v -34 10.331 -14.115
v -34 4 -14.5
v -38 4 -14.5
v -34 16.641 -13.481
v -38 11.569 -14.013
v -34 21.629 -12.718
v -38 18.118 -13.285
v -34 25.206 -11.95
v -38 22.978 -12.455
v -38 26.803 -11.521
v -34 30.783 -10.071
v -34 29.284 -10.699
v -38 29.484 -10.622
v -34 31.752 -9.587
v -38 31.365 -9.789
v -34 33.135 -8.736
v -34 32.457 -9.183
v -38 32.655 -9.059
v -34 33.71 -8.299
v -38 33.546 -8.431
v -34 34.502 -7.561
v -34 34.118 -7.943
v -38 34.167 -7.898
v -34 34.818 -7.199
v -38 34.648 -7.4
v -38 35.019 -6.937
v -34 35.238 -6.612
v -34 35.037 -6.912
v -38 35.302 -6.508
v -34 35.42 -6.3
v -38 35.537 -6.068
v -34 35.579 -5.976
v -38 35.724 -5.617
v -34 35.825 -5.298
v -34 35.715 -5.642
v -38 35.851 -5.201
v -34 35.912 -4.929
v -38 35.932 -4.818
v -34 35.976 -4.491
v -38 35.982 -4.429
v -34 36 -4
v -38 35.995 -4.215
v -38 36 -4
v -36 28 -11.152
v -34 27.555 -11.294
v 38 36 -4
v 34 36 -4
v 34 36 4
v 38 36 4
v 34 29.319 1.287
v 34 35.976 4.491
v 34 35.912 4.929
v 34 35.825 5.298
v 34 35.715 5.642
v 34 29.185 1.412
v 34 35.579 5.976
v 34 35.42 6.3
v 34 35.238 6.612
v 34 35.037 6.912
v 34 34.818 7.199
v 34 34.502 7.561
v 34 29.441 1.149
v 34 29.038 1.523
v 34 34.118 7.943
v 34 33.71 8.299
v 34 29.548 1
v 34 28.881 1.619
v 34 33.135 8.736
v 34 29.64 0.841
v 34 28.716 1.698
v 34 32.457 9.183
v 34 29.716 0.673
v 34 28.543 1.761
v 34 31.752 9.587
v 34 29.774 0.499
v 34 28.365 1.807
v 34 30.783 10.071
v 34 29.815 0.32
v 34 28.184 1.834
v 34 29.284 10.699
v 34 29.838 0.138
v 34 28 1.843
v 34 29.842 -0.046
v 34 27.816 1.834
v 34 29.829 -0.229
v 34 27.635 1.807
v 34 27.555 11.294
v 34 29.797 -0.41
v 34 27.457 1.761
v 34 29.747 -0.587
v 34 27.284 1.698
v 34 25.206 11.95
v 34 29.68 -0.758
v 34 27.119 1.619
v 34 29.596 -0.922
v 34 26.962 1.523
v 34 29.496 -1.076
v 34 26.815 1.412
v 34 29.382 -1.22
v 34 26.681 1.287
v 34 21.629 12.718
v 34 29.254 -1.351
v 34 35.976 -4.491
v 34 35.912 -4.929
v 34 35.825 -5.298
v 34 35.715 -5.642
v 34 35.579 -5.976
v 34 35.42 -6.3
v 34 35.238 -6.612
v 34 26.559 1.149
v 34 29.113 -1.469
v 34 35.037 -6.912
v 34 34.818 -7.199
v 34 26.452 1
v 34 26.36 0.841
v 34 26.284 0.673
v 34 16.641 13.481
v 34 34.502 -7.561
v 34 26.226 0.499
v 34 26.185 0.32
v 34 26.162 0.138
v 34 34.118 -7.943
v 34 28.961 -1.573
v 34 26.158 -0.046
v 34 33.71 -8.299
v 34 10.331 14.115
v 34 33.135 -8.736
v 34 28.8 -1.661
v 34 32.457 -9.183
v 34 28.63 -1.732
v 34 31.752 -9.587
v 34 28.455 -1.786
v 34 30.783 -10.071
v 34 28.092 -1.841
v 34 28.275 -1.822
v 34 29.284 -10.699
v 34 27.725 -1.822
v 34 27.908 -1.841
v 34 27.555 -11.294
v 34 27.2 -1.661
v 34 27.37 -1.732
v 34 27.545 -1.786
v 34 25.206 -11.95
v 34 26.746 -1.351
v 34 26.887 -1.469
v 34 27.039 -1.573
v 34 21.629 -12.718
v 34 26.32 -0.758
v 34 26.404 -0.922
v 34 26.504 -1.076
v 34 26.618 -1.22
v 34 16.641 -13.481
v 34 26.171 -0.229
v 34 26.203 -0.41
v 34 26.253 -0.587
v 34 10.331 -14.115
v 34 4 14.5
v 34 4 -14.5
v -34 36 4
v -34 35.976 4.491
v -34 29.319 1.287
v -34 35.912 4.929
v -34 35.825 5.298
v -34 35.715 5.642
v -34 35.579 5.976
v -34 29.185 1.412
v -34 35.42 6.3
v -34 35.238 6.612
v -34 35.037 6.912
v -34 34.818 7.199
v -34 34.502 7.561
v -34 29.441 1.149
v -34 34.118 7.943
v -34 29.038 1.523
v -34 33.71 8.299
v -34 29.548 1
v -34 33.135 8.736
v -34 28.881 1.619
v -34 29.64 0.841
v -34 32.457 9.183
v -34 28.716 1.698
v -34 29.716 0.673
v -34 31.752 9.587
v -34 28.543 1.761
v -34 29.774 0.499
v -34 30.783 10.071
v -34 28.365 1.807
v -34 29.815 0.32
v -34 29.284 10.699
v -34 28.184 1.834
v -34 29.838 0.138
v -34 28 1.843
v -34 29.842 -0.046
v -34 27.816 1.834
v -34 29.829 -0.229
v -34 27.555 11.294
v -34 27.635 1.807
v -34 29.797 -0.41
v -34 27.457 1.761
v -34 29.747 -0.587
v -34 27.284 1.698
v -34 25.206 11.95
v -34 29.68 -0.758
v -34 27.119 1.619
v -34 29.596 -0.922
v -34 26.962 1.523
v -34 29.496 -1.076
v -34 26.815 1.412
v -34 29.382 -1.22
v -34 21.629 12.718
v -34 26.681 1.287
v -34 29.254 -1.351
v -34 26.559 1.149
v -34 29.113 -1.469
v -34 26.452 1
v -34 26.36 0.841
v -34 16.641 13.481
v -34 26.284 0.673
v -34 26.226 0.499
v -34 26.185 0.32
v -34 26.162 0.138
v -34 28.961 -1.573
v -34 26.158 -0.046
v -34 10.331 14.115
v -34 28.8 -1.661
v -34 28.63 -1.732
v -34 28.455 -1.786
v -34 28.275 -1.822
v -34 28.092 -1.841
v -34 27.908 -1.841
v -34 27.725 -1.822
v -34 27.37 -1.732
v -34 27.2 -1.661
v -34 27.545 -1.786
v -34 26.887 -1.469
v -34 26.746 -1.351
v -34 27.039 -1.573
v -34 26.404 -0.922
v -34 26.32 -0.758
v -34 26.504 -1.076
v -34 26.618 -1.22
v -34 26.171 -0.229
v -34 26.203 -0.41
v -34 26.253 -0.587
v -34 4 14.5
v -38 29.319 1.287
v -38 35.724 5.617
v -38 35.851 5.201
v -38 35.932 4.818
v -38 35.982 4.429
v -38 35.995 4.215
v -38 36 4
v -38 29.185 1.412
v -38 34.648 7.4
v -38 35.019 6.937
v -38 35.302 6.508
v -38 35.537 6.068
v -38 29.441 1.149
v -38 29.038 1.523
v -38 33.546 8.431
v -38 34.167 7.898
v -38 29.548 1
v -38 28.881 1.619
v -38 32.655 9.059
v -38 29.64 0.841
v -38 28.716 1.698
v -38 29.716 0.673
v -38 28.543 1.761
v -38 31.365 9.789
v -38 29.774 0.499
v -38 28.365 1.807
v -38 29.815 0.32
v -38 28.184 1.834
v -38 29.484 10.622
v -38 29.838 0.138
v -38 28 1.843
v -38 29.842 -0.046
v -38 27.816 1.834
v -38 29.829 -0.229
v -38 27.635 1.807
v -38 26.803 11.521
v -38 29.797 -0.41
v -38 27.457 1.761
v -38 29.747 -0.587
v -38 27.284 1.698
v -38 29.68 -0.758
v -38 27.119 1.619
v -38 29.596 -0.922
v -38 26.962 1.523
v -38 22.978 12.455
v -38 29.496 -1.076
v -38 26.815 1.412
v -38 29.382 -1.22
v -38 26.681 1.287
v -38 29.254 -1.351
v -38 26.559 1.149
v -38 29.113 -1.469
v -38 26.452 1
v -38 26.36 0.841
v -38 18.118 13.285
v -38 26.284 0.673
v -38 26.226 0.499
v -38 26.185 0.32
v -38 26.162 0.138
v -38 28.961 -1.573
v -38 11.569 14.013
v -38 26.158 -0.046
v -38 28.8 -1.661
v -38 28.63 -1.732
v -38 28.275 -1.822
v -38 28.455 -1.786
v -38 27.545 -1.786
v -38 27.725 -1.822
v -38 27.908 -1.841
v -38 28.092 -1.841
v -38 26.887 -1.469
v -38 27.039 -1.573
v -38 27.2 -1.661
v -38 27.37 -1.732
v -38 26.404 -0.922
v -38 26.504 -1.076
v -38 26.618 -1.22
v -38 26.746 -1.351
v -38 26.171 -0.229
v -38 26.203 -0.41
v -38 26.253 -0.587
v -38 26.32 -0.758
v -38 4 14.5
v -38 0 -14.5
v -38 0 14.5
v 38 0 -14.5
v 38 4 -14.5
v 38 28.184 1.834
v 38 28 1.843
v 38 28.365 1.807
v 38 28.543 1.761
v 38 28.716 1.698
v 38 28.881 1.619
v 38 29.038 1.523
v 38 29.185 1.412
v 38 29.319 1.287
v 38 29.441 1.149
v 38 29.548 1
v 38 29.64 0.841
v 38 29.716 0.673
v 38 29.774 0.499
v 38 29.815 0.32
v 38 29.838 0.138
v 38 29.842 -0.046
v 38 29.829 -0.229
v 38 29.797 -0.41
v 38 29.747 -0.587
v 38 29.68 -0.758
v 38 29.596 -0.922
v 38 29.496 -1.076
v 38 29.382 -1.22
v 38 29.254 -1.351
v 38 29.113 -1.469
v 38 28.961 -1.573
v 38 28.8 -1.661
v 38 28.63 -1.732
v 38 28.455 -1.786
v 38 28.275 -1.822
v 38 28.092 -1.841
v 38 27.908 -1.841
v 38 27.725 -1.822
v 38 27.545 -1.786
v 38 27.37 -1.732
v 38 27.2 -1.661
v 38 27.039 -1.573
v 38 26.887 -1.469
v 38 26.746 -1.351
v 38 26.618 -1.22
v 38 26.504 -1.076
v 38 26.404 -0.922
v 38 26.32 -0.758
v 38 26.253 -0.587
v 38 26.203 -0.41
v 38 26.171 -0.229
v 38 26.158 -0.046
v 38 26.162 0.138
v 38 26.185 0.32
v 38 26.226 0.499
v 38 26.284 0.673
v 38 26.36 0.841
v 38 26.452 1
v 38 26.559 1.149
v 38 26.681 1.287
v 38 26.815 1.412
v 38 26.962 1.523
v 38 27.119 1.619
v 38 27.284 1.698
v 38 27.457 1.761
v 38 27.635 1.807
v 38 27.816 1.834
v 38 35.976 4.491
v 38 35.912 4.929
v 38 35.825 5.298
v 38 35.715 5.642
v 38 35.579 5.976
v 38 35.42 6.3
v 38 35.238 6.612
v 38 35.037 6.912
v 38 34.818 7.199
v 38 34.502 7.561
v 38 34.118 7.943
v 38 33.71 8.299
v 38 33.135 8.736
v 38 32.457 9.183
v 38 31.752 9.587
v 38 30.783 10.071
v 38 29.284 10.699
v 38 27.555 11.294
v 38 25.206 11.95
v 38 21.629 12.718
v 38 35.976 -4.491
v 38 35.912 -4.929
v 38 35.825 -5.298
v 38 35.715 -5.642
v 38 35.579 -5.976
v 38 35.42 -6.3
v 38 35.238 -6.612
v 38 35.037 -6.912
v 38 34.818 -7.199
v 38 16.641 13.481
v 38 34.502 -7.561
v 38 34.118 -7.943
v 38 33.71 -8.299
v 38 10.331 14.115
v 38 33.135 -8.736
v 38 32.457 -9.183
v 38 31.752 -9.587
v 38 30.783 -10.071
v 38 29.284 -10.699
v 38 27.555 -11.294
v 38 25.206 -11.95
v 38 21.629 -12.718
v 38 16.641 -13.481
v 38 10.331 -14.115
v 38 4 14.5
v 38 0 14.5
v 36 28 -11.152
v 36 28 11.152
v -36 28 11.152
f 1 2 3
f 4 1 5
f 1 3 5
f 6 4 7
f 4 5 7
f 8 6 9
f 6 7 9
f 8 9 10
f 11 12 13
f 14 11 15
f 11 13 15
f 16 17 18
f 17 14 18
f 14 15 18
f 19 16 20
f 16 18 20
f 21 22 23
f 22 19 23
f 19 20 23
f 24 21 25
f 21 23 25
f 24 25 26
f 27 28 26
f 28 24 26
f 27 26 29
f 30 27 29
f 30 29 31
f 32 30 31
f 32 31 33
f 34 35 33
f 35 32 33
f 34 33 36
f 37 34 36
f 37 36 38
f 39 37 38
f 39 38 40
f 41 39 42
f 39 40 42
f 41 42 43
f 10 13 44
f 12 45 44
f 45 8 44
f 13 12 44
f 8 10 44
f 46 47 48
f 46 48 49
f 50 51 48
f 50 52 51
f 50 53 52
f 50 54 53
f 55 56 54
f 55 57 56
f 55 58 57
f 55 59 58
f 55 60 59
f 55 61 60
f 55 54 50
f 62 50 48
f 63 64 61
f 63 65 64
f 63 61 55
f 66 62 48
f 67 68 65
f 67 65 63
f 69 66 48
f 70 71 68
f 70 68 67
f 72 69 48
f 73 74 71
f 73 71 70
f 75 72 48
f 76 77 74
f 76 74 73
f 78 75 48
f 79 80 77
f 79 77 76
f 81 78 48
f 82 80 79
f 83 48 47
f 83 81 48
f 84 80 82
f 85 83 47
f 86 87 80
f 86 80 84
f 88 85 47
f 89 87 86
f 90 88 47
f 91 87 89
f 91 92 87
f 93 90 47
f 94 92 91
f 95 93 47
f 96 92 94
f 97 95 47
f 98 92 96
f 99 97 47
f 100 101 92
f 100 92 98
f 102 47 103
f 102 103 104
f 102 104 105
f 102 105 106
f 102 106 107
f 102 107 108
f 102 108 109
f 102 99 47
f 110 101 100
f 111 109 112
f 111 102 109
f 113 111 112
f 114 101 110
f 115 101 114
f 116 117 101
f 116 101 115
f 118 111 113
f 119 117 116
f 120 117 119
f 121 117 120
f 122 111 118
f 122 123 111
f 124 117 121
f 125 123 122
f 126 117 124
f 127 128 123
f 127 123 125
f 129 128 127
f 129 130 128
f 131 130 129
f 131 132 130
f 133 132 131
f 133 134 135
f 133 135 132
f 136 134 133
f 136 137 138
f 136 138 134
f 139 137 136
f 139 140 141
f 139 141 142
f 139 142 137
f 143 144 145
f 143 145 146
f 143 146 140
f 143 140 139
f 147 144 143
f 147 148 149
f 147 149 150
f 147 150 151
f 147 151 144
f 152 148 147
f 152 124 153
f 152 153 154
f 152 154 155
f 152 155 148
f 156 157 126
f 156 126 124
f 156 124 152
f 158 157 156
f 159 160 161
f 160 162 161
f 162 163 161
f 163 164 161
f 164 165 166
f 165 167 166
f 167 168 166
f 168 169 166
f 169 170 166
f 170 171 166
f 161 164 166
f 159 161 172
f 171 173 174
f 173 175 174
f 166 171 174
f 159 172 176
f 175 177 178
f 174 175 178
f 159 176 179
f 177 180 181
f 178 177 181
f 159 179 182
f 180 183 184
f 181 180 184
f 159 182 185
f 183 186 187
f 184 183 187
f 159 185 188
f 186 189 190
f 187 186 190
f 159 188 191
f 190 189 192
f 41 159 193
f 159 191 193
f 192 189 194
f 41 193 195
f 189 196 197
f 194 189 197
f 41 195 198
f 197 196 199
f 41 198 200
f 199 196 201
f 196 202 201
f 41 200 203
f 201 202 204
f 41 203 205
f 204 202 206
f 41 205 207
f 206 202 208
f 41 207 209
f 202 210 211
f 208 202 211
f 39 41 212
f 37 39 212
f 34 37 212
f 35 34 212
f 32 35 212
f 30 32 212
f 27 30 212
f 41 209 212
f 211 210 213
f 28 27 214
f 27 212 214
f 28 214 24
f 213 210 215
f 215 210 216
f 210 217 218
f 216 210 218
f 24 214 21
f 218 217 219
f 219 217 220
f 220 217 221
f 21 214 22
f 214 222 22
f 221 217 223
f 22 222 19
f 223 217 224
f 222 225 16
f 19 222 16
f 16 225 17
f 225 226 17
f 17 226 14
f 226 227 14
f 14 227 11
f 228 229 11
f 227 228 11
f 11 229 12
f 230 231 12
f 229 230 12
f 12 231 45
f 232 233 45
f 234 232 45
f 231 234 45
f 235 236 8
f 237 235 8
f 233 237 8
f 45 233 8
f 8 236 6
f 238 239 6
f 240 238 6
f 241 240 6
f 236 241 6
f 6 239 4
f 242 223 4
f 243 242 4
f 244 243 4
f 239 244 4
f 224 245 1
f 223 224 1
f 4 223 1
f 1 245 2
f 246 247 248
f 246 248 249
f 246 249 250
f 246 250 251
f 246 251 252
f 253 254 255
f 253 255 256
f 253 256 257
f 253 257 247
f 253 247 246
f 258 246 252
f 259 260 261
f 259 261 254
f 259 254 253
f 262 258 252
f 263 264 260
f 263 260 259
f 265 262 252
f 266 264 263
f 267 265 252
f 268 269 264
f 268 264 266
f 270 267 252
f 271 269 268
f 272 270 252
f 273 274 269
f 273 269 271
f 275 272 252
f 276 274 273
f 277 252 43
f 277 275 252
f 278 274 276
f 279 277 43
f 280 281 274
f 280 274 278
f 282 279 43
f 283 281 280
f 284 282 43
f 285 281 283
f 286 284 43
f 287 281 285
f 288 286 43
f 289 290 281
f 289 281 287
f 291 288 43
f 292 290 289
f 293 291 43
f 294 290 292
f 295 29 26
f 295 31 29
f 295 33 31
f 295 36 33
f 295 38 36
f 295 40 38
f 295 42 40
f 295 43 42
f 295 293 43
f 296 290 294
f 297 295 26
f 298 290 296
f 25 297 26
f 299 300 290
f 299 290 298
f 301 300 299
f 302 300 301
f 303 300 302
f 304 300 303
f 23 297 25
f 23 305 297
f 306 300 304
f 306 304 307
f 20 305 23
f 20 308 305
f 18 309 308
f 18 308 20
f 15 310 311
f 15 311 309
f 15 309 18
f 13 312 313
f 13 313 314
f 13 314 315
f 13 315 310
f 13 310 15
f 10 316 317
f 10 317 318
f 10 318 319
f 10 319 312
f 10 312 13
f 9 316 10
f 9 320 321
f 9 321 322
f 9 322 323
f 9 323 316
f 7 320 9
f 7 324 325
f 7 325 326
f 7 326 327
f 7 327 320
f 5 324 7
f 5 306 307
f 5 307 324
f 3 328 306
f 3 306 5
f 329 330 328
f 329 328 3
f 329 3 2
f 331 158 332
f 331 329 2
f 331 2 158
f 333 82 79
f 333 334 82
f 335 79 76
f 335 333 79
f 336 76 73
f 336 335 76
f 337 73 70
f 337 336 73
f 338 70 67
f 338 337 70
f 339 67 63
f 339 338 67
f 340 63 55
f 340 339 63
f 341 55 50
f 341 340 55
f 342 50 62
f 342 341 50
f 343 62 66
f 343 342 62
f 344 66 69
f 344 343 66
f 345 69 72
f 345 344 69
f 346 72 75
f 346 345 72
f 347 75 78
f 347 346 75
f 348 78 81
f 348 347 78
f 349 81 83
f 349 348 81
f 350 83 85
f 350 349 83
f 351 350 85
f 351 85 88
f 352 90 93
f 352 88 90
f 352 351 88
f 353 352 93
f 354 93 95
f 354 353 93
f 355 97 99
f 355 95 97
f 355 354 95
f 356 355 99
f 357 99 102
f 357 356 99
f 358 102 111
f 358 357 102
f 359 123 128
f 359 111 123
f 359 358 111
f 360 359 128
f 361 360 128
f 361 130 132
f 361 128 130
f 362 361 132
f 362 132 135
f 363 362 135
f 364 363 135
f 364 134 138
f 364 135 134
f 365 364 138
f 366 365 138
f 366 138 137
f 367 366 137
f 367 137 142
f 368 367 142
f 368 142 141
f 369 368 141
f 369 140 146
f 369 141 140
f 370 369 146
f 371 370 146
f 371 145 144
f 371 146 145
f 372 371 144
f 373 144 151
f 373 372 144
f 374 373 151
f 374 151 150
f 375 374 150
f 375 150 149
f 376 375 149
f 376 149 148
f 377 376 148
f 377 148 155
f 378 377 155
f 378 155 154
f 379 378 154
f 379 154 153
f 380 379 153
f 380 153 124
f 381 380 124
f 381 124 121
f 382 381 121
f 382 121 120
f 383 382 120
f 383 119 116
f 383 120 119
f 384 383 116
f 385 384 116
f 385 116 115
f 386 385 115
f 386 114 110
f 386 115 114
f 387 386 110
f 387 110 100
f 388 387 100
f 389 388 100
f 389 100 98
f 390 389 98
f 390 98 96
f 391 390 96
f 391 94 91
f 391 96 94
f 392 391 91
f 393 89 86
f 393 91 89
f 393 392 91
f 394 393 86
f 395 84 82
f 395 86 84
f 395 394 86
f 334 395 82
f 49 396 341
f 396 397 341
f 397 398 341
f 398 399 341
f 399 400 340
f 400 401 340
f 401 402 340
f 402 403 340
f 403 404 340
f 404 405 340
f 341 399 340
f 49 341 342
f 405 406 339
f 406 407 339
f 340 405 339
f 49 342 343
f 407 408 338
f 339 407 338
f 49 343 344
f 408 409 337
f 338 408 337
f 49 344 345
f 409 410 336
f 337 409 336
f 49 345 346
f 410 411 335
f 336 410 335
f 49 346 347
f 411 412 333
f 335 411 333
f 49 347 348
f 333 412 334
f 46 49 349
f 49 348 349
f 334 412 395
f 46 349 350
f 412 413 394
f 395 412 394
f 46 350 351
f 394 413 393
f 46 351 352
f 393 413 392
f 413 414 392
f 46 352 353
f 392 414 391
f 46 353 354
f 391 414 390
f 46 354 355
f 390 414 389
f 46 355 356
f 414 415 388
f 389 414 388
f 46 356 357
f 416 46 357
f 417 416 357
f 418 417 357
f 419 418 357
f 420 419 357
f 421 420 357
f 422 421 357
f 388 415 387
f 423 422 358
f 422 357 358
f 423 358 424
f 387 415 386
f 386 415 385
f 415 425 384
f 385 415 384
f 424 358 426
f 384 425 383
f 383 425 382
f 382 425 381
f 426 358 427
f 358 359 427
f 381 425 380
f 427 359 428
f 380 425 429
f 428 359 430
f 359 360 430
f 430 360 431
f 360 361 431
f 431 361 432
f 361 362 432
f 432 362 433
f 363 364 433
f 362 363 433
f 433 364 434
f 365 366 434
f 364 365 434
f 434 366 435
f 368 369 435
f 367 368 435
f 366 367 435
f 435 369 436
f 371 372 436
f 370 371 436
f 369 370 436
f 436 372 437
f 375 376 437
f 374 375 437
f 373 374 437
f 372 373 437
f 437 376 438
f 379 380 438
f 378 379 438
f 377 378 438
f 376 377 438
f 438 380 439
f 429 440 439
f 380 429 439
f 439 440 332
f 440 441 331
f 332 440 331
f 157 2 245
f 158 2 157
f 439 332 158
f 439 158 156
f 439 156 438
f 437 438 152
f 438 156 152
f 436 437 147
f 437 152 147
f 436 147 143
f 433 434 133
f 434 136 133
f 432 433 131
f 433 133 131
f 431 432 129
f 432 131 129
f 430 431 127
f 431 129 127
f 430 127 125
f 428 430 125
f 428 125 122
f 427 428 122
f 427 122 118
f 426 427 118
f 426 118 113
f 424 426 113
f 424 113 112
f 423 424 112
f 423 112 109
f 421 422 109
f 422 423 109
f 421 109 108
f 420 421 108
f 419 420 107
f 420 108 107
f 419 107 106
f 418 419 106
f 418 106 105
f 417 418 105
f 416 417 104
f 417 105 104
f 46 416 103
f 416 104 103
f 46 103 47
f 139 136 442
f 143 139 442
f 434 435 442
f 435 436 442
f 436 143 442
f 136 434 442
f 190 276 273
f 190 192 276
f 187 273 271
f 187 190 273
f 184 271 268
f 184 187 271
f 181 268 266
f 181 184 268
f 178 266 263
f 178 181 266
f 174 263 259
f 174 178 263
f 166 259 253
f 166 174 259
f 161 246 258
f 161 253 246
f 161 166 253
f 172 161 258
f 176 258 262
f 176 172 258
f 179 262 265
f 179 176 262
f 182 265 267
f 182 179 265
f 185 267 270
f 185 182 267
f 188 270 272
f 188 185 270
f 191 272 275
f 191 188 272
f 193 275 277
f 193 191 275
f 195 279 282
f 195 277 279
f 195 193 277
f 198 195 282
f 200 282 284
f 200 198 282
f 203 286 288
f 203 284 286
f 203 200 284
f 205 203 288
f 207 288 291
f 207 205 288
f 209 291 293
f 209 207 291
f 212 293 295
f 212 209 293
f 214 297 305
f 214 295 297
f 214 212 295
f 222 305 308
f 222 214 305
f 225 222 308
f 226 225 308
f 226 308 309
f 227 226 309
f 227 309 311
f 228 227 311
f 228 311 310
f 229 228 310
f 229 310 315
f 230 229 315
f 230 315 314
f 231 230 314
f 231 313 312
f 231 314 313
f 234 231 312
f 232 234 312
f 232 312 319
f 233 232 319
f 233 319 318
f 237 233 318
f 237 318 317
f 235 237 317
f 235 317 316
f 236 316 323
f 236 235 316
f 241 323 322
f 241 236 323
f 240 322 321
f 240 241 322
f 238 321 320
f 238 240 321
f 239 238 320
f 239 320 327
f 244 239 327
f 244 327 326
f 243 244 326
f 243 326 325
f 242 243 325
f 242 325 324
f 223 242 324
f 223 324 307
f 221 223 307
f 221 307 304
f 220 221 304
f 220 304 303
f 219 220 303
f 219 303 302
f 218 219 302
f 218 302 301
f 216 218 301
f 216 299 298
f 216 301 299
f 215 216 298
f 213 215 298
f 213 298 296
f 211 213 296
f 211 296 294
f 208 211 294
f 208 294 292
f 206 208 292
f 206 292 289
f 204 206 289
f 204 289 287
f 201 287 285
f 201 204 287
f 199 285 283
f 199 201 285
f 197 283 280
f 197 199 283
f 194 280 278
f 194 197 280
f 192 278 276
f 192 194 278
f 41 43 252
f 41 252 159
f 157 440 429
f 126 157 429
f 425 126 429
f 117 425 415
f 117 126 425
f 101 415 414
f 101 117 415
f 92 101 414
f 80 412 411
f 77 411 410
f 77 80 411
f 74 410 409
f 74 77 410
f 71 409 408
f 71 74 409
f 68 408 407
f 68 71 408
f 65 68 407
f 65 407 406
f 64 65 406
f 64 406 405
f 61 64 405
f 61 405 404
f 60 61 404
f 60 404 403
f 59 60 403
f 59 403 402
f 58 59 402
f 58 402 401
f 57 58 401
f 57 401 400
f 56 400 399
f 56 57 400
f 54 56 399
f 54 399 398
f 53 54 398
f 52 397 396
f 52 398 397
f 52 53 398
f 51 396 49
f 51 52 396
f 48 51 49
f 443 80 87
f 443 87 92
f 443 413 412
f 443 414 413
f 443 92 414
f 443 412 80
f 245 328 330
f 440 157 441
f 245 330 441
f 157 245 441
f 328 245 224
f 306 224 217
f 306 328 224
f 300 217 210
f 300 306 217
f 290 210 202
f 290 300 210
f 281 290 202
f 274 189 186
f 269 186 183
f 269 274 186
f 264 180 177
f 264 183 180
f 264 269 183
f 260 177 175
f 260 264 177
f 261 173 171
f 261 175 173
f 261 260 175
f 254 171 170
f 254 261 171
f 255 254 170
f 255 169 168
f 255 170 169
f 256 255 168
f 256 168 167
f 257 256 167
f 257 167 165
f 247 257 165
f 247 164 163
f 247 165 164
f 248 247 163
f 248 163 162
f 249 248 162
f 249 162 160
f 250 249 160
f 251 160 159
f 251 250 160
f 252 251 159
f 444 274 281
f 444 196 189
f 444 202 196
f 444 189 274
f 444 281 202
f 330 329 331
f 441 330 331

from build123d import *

# Parameters (mm, degrees)
SKETCH1_W               = 76
SKETCH1_H               = 29
BOSS_EXTRUDE1_DEPTH     = 4
SKETCH2_W               = 4
SKETCH2_H               = 29
BOSS_EXTRUDE2_DEPTH     = 32
CUT_EXTRUDE1_REACH      = 87.336
CUT_EXTRUDE2_DEPTH      = 82.793948581
CUT_EXTRUDE2_DEPTH_BACK = 82.793948581
SKETCH4_R               = 1.843066456


with BuildPart() as part:
    # Sketch1 → Boss-Extrude1 (new body)
    with BuildSketch(Plane(origin=(0, 0, 0), x_dir=(1, 0, 0), z_dir=(0, 1, 0))):
        Rectangle(SKETCH1_W, SKETCH1_H)
    extrude(amount=BOSS_EXTRUDE1_DEPTH)

    # Sketch2 → Boss-Extrude2 (add)
    with BuildSketch(Plane(origin=(0, 4, 0), x_dir=(1, 0, 0), z_dir=(0, 1, 0))):
        with Locations((-36, 0)):
            Rectangle(SKETCH2_W, SKETCH2_H)
        with Locations((36, 0)):
            Rectangle(SKETCH2_W, SKETCH2_H)
    extrude(amount=BOSS_EXTRUDE2_DEPTH)

    # Cut-Extrude1: up to this face of the body (flat: up to its plane)
    cut_extrude1_end = Plane(part.part.faces().sort_by_distance((38, 18, 0))[0])
    # Sketch3 → Cut-Extrude1 (cut, up to the picked face)
    with BuildSketch(Plane.ZY.offset(38), mode=Mode.PRIVATE) as cut_extrude1_sk1:
        with BuildLine():
            Line((14.5, 4), (14.5, 36))
            Line((14.5, 36), (4, 36))
            add(Edge.make_bspline(
                [(14.5, 4), (13.053007325, 36), (4, 36)],
                knots=[0, 0, 0, 1, 1, 1], degree=2))
        make_face()
    cut_extrude1_tool1 = split(extrude(cut_extrude1_sk1.sketch, amount=-CUT_EXTRUDE1_REACH, mode=Mode.PRIVATE), bisect_by=cut_extrude1_end, keep=Keep.BOTH, mode=Mode.PRIVATE)
    # Sketch3 → Cut-Extrude1 (cut, up to the picked face)
    with BuildSketch(Plane.ZY.offset(38), mode=Mode.PRIVATE) as cut_extrude1_sk2:
        with BuildLine():
            Line((-4, 36), (-14.5, 36))
            Line((-14.5, 36), (-14.5, 4))
            add(Edge.make_bspline(
                [(-14.5, 4), (-13.053007325, 36), (-4, 36)],
                knots=[0, 0, 0, 1, 1, 1], degree=2))
        make_face()
    cut_extrude1_tool2 = split(extrude(cut_extrude1_sk2.sketch, amount=-CUT_EXTRUDE1_REACH, mode=Mode.PRIVATE), bisect_by=cut_extrude1_end, keep=Keep.BOTH, mode=Mode.PRIVATE)
    add(cut_extrude1_tool1.solids().sort_by(Axis((-38, 28.217177, 12.337471), (1, 0, 0)))[0], mode=Mode.SUBTRACT)
    add(cut_extrude1_tool2.solids().sort_by(Axis((-38, 28.217177, -12.337471), (1, 0, 0)))[0], mode=Mode.SUBTRACT)

    # Sketch4 → Cut-Extrude2 (cut, two sides: drawn at the far end of the back side and taken through both)
    with BuildSketch(Plane.ZY.offset(-34).offset(-CUT_EXTRUDE2_DEPTH_BACK)):
        with Locations((0, 28)):
            Circle(SKETCH4_R)
    extrude(amount=CUT_EXTRUDE2_DEPTH + CUT_EXTRUDE2_DEPTH_BACK, mode=Mode.SUBTRACT)


solid = part.part
